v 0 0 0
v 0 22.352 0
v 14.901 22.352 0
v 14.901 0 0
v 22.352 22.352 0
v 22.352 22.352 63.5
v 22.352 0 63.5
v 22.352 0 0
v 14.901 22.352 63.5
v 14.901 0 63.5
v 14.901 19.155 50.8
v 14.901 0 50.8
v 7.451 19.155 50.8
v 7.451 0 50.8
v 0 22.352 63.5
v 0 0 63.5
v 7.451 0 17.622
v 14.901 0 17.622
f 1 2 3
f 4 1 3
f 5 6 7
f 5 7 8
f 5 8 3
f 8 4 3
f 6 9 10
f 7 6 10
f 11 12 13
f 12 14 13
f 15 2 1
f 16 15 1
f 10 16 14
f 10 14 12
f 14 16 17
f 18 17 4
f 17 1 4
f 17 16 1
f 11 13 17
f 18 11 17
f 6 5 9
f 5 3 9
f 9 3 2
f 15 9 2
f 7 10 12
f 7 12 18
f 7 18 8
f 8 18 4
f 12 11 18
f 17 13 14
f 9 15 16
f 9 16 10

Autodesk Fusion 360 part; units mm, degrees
sketch "Sketch1" plane through (0, 0, 0) normal (0, 0, 1) x (1, 0, 0)
  line L0 (0, 0) -> (22.352, 0)
  line L1 (22.352, 0) -> (22.352, 22.352)
  line L2 (22.352, 22.352) -> (0, 22.352)
  line L3 (0, 22.352) -> (0, 0)
  line L4 (7.4507, 22.352) -> (7.4507, 0)
  dimension "d1" = 22.352
  dimension "d2" = 22.352
  dimension "d3" = 7.4507
extrude "Extrude1" add sketch "Sketch1" along normal blind 63.5 contours L0 L2 L3 L4
sketch "Sketch2" plane through (7.4507, 0, 0) normal (1, 0, 0) x (0, 0, -1)
  line L0 (0, 0) -> (0, 22.352)
  line L1 (0, 22.352) -> (-63.5, 22.352)
  line L2 (-63.5, 22.352) -> (-63.5, 0)
  line L3 (-63.5, 0) -> (0, 0)
  line L4 (-50.8, 0) -> (-50.8, 19.1554)
  line L5 (-50.8, 19.1554) -> (-17.6219, 0)
  dimension "d6" = 12.7
  dimension "d7" = 30
extrude "Extrude2" add sketch "Sketch2" along normal blind 7.4507 contours L0 L1 L2 L3 L4 L5
sketch "Sketch3" plane through (14.9013, 0, 0) normal (1, 0, 0) x (0, 0, -1)
  line L0 (-50.8, 19.1554) -> (-17.6219, 0)
  line L1 (-17.6219, 0) -> (0, 0)
  line L2 (0, 0) -> (0, 22.352)
  line L3 (0, 22.352) -> (-63.5, 22.352)
  line L4 (-63.5, 22.352) -> (-63.5, 0)
  line L5 (-63.5, 0) -> (-50.8, 0)
  line L6 (-50.8, 0) -> (-50.8, 19.1554)
  line L7 (-63.5, 0) -> (0, 0)
  line L8 (0, 0) -> (0, 22.352)
  line L9 (0, 22.352) -> (-63.5, 22.352)
  line L10 (-63.5, 22.352) -> (-63.5, 0)
extrude "Extrude3" add sketch "Sketch3" along normal blind 7.4507
equation "d3 = ( 0.88 / 3 ) * 1 in"
equation "d8 = ( 0.88 / 3 ) * 1 in"
equation "d10 = ( 0.88 / 3 ) * 1 in"
